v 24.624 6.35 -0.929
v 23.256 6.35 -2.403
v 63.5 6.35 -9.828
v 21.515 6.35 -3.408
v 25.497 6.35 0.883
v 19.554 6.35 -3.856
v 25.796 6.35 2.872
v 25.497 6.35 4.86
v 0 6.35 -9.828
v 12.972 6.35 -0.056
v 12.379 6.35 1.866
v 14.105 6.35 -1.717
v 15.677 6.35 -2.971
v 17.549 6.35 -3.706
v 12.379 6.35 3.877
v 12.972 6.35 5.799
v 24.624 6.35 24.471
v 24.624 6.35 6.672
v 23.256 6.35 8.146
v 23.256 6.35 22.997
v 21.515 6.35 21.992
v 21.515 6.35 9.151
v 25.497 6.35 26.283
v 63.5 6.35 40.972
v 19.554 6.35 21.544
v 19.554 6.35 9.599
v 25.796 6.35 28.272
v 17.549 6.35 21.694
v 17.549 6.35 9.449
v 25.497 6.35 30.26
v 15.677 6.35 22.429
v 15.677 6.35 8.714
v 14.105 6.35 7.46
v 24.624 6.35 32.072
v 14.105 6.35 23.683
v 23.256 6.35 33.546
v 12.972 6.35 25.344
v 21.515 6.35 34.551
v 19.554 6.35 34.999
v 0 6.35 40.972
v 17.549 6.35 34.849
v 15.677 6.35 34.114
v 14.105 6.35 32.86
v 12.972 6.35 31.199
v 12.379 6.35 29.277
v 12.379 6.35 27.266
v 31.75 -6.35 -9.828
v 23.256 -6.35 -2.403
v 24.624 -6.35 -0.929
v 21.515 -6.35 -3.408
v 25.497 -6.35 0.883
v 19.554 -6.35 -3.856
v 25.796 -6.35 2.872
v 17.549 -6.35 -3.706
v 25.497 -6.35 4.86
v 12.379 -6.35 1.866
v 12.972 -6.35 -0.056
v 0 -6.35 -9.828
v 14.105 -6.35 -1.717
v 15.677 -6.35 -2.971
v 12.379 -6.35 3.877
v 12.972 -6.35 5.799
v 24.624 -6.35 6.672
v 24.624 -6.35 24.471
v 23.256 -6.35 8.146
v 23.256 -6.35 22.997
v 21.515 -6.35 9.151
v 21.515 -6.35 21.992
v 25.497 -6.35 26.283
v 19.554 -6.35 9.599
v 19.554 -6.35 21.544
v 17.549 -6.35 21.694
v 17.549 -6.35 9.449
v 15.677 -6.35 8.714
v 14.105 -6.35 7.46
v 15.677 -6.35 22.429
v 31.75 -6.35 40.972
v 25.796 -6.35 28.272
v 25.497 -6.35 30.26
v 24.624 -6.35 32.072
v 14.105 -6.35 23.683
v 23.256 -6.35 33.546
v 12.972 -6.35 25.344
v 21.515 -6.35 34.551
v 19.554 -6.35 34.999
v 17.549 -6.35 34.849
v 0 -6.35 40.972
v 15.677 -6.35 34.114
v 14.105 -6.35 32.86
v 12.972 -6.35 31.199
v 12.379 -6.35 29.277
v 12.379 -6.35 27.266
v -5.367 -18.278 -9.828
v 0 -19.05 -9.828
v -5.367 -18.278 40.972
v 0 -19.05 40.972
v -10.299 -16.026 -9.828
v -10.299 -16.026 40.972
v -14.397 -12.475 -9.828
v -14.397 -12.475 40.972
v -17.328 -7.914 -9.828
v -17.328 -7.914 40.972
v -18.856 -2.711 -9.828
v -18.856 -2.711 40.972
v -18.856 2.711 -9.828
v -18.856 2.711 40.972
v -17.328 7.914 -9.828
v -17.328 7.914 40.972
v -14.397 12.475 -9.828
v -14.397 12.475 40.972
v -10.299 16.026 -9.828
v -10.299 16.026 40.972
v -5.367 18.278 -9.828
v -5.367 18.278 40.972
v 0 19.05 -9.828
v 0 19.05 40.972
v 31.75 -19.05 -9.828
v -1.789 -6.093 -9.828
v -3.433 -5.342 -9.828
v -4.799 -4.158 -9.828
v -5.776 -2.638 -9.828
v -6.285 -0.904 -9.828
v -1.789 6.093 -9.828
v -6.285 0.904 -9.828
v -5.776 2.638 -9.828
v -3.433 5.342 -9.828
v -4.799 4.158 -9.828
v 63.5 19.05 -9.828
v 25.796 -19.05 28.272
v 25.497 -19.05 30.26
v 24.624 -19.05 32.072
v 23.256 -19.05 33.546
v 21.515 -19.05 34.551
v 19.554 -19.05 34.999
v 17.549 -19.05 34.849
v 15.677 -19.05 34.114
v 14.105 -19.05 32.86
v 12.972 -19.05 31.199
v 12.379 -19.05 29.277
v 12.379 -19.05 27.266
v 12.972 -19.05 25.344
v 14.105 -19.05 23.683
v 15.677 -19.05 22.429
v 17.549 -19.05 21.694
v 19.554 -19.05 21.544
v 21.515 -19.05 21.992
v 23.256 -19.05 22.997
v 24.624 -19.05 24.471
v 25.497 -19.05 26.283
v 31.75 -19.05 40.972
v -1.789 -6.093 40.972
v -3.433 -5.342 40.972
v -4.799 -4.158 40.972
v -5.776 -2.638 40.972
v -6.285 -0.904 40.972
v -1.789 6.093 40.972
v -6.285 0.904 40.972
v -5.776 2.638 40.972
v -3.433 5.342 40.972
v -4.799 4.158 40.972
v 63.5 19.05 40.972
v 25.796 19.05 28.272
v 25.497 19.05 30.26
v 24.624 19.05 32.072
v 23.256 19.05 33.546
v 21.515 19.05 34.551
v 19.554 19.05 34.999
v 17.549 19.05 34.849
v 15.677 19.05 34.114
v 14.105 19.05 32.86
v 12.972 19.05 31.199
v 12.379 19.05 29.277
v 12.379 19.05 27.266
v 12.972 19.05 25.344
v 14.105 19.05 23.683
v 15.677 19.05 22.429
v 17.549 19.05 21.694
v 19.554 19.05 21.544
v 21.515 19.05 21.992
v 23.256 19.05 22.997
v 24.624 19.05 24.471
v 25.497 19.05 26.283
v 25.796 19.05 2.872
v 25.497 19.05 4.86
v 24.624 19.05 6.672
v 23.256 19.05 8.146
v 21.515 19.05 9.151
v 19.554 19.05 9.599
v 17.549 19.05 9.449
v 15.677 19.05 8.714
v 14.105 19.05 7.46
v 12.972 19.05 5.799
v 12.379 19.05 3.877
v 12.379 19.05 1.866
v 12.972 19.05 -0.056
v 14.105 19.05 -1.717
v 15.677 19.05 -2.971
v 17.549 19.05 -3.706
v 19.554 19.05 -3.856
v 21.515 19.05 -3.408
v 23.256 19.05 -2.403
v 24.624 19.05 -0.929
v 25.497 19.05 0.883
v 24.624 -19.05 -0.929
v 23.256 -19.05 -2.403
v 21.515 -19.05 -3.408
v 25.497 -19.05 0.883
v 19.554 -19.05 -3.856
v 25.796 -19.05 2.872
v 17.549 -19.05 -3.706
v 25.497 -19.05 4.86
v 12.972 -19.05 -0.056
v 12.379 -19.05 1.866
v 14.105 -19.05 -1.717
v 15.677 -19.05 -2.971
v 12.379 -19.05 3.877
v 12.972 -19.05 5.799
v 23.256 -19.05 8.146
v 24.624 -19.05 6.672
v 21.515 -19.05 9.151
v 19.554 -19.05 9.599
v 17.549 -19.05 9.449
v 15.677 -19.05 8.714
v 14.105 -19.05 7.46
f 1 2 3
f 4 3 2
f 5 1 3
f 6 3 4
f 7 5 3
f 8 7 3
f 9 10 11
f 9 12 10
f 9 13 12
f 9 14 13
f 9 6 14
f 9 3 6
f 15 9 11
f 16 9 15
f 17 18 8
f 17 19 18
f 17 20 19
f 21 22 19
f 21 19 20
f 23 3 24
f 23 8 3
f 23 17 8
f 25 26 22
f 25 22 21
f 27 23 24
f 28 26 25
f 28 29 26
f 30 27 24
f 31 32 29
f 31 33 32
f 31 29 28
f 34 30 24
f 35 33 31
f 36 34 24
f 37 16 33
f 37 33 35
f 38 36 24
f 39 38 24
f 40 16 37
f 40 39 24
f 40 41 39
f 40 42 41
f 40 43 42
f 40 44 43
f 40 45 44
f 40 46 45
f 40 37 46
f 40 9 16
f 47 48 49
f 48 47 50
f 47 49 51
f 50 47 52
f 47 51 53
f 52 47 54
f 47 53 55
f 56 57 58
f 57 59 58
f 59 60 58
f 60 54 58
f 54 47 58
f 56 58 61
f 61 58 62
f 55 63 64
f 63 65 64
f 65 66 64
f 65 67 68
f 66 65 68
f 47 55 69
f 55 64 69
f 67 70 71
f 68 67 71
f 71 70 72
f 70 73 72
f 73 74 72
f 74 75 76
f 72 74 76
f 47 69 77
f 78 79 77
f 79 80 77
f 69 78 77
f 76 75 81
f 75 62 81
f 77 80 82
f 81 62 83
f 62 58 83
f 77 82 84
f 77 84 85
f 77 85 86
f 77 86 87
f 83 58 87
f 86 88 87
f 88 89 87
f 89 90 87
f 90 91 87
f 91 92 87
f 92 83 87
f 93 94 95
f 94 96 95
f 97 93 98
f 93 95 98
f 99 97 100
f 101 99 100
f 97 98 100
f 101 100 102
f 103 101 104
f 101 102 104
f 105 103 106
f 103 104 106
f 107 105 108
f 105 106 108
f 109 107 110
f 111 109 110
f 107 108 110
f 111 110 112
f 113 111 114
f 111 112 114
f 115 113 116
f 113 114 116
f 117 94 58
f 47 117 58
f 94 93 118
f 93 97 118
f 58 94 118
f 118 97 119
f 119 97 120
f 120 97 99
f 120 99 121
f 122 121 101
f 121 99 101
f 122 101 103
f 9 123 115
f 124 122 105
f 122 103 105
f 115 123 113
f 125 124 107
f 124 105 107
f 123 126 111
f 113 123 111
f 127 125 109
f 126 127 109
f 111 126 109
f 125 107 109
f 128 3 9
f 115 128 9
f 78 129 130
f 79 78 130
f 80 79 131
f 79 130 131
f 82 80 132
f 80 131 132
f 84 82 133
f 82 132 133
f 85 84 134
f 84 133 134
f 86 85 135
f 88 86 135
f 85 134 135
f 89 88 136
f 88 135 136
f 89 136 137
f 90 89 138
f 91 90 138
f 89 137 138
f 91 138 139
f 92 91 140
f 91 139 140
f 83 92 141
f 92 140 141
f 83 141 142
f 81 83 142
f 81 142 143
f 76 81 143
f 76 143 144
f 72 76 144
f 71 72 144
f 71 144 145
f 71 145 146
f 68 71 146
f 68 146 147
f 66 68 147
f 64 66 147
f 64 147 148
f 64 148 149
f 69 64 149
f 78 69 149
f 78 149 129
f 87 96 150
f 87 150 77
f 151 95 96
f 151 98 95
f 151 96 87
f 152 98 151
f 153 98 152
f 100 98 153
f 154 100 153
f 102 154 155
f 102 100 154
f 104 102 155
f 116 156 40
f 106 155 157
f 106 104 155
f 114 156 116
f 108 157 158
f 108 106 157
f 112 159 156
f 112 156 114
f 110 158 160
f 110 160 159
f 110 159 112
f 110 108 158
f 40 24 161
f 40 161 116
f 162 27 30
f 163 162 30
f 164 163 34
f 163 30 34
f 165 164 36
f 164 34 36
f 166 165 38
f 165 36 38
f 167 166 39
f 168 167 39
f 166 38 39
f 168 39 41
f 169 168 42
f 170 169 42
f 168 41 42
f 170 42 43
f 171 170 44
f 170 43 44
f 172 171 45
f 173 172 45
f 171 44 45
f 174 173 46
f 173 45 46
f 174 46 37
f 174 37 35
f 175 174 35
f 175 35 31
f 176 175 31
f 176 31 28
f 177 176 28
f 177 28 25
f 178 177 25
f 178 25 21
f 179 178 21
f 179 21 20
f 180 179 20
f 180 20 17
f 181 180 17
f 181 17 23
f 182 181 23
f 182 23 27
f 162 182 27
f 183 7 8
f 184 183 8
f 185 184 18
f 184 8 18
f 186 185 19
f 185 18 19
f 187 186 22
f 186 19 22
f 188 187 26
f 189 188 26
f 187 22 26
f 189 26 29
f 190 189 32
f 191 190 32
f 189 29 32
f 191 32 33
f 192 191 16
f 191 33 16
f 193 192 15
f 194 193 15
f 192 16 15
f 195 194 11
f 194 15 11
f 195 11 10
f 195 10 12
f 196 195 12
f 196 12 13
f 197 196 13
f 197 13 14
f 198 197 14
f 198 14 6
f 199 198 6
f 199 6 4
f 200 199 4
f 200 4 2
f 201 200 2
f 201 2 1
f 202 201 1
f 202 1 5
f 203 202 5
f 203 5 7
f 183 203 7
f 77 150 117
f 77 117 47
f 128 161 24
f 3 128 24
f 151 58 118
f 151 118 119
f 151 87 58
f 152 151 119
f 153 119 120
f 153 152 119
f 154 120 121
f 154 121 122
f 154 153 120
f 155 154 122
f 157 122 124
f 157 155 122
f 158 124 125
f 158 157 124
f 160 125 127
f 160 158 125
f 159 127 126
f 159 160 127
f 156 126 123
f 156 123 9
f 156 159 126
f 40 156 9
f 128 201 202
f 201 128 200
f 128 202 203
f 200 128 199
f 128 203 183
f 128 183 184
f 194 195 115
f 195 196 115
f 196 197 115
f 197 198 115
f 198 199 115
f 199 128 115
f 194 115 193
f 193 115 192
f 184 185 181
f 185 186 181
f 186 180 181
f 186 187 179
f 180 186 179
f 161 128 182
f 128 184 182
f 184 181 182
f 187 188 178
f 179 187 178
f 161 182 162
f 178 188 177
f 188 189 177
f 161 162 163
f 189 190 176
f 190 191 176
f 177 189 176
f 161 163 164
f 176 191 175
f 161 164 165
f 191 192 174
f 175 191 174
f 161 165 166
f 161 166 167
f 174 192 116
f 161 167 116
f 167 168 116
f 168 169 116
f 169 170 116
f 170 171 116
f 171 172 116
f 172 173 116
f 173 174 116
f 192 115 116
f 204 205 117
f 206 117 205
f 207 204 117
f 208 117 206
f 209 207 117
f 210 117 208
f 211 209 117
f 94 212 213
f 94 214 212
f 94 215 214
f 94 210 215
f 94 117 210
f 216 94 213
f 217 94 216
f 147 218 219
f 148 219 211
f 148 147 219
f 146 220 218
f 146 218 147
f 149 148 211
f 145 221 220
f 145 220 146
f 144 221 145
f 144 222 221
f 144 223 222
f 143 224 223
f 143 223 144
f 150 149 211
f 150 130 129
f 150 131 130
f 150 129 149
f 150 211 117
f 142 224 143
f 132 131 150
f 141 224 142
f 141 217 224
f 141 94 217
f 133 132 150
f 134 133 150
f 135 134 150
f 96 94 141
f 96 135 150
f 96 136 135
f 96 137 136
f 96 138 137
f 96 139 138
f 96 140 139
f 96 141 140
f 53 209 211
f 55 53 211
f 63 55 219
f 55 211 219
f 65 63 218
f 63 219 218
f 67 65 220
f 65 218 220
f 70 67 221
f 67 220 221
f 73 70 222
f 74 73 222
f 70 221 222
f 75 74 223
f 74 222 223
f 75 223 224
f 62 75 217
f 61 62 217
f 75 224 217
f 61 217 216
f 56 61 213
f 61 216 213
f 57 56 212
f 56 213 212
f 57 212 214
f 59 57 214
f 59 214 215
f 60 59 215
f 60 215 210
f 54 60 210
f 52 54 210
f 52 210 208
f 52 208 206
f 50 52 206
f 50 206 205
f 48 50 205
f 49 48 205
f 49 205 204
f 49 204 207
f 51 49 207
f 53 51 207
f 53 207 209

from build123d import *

# Parameters (mm, degrees)
F0_W          = 12.7
F0_H          = 50.8
F1_ANGLE_BACK = 90
F1_ANGLE      = 180
F2_DEPTH      = 63.5
F3_DEPTH      = 31.75
F5_D          = 13.49248


with BuildPart() as f1:
    # F0 (on Front) → F1 (revolve)
    with BuildSketch(Plane.XZ, mode=Mode.PRIVATE) as f1_sk:
        with Locations((-12.7, 15.5715065134)):
            Rectangle(F0_W, F0_H)
    revolve(f1_sk.sketch.rotate(Axis((0, 0, 15.5715065134), (0, 0, -1)), -F1_ANGLE_BACK), axis=Axis((0, 0, 15.5715065134), (0, 0, -1)), revolution_arc=F1_ANGLE)

    # F2 (add): a face of the model
    f2_faces = [f1.faces().sort_by_distance(p)[0] for p in [
        (0, 12.7, 15.5715065134),
    ]]
    extrude(f2_faces, amount=F2_DEPTH)

    # F3 (add): a face of the model
    f3_faces = [f1.faces().sort_by_distance(p)[0] for p in [
        (0, -12.7, 15.5715065134),
    ]]
    extrude(f3_faces, amount=F3_DEPTH)

    # F5 (through all)
    with Locations(Plane(origin=(0, 19.05, 0), x_dir=(-1, 0, 0), z_dir=(0, 1, 0))):
        with Locations((-19.05, 2.8715065134), (-19.05, 28.2715065134)):
            Hole(F5_D / 2)


solid = f1.part
